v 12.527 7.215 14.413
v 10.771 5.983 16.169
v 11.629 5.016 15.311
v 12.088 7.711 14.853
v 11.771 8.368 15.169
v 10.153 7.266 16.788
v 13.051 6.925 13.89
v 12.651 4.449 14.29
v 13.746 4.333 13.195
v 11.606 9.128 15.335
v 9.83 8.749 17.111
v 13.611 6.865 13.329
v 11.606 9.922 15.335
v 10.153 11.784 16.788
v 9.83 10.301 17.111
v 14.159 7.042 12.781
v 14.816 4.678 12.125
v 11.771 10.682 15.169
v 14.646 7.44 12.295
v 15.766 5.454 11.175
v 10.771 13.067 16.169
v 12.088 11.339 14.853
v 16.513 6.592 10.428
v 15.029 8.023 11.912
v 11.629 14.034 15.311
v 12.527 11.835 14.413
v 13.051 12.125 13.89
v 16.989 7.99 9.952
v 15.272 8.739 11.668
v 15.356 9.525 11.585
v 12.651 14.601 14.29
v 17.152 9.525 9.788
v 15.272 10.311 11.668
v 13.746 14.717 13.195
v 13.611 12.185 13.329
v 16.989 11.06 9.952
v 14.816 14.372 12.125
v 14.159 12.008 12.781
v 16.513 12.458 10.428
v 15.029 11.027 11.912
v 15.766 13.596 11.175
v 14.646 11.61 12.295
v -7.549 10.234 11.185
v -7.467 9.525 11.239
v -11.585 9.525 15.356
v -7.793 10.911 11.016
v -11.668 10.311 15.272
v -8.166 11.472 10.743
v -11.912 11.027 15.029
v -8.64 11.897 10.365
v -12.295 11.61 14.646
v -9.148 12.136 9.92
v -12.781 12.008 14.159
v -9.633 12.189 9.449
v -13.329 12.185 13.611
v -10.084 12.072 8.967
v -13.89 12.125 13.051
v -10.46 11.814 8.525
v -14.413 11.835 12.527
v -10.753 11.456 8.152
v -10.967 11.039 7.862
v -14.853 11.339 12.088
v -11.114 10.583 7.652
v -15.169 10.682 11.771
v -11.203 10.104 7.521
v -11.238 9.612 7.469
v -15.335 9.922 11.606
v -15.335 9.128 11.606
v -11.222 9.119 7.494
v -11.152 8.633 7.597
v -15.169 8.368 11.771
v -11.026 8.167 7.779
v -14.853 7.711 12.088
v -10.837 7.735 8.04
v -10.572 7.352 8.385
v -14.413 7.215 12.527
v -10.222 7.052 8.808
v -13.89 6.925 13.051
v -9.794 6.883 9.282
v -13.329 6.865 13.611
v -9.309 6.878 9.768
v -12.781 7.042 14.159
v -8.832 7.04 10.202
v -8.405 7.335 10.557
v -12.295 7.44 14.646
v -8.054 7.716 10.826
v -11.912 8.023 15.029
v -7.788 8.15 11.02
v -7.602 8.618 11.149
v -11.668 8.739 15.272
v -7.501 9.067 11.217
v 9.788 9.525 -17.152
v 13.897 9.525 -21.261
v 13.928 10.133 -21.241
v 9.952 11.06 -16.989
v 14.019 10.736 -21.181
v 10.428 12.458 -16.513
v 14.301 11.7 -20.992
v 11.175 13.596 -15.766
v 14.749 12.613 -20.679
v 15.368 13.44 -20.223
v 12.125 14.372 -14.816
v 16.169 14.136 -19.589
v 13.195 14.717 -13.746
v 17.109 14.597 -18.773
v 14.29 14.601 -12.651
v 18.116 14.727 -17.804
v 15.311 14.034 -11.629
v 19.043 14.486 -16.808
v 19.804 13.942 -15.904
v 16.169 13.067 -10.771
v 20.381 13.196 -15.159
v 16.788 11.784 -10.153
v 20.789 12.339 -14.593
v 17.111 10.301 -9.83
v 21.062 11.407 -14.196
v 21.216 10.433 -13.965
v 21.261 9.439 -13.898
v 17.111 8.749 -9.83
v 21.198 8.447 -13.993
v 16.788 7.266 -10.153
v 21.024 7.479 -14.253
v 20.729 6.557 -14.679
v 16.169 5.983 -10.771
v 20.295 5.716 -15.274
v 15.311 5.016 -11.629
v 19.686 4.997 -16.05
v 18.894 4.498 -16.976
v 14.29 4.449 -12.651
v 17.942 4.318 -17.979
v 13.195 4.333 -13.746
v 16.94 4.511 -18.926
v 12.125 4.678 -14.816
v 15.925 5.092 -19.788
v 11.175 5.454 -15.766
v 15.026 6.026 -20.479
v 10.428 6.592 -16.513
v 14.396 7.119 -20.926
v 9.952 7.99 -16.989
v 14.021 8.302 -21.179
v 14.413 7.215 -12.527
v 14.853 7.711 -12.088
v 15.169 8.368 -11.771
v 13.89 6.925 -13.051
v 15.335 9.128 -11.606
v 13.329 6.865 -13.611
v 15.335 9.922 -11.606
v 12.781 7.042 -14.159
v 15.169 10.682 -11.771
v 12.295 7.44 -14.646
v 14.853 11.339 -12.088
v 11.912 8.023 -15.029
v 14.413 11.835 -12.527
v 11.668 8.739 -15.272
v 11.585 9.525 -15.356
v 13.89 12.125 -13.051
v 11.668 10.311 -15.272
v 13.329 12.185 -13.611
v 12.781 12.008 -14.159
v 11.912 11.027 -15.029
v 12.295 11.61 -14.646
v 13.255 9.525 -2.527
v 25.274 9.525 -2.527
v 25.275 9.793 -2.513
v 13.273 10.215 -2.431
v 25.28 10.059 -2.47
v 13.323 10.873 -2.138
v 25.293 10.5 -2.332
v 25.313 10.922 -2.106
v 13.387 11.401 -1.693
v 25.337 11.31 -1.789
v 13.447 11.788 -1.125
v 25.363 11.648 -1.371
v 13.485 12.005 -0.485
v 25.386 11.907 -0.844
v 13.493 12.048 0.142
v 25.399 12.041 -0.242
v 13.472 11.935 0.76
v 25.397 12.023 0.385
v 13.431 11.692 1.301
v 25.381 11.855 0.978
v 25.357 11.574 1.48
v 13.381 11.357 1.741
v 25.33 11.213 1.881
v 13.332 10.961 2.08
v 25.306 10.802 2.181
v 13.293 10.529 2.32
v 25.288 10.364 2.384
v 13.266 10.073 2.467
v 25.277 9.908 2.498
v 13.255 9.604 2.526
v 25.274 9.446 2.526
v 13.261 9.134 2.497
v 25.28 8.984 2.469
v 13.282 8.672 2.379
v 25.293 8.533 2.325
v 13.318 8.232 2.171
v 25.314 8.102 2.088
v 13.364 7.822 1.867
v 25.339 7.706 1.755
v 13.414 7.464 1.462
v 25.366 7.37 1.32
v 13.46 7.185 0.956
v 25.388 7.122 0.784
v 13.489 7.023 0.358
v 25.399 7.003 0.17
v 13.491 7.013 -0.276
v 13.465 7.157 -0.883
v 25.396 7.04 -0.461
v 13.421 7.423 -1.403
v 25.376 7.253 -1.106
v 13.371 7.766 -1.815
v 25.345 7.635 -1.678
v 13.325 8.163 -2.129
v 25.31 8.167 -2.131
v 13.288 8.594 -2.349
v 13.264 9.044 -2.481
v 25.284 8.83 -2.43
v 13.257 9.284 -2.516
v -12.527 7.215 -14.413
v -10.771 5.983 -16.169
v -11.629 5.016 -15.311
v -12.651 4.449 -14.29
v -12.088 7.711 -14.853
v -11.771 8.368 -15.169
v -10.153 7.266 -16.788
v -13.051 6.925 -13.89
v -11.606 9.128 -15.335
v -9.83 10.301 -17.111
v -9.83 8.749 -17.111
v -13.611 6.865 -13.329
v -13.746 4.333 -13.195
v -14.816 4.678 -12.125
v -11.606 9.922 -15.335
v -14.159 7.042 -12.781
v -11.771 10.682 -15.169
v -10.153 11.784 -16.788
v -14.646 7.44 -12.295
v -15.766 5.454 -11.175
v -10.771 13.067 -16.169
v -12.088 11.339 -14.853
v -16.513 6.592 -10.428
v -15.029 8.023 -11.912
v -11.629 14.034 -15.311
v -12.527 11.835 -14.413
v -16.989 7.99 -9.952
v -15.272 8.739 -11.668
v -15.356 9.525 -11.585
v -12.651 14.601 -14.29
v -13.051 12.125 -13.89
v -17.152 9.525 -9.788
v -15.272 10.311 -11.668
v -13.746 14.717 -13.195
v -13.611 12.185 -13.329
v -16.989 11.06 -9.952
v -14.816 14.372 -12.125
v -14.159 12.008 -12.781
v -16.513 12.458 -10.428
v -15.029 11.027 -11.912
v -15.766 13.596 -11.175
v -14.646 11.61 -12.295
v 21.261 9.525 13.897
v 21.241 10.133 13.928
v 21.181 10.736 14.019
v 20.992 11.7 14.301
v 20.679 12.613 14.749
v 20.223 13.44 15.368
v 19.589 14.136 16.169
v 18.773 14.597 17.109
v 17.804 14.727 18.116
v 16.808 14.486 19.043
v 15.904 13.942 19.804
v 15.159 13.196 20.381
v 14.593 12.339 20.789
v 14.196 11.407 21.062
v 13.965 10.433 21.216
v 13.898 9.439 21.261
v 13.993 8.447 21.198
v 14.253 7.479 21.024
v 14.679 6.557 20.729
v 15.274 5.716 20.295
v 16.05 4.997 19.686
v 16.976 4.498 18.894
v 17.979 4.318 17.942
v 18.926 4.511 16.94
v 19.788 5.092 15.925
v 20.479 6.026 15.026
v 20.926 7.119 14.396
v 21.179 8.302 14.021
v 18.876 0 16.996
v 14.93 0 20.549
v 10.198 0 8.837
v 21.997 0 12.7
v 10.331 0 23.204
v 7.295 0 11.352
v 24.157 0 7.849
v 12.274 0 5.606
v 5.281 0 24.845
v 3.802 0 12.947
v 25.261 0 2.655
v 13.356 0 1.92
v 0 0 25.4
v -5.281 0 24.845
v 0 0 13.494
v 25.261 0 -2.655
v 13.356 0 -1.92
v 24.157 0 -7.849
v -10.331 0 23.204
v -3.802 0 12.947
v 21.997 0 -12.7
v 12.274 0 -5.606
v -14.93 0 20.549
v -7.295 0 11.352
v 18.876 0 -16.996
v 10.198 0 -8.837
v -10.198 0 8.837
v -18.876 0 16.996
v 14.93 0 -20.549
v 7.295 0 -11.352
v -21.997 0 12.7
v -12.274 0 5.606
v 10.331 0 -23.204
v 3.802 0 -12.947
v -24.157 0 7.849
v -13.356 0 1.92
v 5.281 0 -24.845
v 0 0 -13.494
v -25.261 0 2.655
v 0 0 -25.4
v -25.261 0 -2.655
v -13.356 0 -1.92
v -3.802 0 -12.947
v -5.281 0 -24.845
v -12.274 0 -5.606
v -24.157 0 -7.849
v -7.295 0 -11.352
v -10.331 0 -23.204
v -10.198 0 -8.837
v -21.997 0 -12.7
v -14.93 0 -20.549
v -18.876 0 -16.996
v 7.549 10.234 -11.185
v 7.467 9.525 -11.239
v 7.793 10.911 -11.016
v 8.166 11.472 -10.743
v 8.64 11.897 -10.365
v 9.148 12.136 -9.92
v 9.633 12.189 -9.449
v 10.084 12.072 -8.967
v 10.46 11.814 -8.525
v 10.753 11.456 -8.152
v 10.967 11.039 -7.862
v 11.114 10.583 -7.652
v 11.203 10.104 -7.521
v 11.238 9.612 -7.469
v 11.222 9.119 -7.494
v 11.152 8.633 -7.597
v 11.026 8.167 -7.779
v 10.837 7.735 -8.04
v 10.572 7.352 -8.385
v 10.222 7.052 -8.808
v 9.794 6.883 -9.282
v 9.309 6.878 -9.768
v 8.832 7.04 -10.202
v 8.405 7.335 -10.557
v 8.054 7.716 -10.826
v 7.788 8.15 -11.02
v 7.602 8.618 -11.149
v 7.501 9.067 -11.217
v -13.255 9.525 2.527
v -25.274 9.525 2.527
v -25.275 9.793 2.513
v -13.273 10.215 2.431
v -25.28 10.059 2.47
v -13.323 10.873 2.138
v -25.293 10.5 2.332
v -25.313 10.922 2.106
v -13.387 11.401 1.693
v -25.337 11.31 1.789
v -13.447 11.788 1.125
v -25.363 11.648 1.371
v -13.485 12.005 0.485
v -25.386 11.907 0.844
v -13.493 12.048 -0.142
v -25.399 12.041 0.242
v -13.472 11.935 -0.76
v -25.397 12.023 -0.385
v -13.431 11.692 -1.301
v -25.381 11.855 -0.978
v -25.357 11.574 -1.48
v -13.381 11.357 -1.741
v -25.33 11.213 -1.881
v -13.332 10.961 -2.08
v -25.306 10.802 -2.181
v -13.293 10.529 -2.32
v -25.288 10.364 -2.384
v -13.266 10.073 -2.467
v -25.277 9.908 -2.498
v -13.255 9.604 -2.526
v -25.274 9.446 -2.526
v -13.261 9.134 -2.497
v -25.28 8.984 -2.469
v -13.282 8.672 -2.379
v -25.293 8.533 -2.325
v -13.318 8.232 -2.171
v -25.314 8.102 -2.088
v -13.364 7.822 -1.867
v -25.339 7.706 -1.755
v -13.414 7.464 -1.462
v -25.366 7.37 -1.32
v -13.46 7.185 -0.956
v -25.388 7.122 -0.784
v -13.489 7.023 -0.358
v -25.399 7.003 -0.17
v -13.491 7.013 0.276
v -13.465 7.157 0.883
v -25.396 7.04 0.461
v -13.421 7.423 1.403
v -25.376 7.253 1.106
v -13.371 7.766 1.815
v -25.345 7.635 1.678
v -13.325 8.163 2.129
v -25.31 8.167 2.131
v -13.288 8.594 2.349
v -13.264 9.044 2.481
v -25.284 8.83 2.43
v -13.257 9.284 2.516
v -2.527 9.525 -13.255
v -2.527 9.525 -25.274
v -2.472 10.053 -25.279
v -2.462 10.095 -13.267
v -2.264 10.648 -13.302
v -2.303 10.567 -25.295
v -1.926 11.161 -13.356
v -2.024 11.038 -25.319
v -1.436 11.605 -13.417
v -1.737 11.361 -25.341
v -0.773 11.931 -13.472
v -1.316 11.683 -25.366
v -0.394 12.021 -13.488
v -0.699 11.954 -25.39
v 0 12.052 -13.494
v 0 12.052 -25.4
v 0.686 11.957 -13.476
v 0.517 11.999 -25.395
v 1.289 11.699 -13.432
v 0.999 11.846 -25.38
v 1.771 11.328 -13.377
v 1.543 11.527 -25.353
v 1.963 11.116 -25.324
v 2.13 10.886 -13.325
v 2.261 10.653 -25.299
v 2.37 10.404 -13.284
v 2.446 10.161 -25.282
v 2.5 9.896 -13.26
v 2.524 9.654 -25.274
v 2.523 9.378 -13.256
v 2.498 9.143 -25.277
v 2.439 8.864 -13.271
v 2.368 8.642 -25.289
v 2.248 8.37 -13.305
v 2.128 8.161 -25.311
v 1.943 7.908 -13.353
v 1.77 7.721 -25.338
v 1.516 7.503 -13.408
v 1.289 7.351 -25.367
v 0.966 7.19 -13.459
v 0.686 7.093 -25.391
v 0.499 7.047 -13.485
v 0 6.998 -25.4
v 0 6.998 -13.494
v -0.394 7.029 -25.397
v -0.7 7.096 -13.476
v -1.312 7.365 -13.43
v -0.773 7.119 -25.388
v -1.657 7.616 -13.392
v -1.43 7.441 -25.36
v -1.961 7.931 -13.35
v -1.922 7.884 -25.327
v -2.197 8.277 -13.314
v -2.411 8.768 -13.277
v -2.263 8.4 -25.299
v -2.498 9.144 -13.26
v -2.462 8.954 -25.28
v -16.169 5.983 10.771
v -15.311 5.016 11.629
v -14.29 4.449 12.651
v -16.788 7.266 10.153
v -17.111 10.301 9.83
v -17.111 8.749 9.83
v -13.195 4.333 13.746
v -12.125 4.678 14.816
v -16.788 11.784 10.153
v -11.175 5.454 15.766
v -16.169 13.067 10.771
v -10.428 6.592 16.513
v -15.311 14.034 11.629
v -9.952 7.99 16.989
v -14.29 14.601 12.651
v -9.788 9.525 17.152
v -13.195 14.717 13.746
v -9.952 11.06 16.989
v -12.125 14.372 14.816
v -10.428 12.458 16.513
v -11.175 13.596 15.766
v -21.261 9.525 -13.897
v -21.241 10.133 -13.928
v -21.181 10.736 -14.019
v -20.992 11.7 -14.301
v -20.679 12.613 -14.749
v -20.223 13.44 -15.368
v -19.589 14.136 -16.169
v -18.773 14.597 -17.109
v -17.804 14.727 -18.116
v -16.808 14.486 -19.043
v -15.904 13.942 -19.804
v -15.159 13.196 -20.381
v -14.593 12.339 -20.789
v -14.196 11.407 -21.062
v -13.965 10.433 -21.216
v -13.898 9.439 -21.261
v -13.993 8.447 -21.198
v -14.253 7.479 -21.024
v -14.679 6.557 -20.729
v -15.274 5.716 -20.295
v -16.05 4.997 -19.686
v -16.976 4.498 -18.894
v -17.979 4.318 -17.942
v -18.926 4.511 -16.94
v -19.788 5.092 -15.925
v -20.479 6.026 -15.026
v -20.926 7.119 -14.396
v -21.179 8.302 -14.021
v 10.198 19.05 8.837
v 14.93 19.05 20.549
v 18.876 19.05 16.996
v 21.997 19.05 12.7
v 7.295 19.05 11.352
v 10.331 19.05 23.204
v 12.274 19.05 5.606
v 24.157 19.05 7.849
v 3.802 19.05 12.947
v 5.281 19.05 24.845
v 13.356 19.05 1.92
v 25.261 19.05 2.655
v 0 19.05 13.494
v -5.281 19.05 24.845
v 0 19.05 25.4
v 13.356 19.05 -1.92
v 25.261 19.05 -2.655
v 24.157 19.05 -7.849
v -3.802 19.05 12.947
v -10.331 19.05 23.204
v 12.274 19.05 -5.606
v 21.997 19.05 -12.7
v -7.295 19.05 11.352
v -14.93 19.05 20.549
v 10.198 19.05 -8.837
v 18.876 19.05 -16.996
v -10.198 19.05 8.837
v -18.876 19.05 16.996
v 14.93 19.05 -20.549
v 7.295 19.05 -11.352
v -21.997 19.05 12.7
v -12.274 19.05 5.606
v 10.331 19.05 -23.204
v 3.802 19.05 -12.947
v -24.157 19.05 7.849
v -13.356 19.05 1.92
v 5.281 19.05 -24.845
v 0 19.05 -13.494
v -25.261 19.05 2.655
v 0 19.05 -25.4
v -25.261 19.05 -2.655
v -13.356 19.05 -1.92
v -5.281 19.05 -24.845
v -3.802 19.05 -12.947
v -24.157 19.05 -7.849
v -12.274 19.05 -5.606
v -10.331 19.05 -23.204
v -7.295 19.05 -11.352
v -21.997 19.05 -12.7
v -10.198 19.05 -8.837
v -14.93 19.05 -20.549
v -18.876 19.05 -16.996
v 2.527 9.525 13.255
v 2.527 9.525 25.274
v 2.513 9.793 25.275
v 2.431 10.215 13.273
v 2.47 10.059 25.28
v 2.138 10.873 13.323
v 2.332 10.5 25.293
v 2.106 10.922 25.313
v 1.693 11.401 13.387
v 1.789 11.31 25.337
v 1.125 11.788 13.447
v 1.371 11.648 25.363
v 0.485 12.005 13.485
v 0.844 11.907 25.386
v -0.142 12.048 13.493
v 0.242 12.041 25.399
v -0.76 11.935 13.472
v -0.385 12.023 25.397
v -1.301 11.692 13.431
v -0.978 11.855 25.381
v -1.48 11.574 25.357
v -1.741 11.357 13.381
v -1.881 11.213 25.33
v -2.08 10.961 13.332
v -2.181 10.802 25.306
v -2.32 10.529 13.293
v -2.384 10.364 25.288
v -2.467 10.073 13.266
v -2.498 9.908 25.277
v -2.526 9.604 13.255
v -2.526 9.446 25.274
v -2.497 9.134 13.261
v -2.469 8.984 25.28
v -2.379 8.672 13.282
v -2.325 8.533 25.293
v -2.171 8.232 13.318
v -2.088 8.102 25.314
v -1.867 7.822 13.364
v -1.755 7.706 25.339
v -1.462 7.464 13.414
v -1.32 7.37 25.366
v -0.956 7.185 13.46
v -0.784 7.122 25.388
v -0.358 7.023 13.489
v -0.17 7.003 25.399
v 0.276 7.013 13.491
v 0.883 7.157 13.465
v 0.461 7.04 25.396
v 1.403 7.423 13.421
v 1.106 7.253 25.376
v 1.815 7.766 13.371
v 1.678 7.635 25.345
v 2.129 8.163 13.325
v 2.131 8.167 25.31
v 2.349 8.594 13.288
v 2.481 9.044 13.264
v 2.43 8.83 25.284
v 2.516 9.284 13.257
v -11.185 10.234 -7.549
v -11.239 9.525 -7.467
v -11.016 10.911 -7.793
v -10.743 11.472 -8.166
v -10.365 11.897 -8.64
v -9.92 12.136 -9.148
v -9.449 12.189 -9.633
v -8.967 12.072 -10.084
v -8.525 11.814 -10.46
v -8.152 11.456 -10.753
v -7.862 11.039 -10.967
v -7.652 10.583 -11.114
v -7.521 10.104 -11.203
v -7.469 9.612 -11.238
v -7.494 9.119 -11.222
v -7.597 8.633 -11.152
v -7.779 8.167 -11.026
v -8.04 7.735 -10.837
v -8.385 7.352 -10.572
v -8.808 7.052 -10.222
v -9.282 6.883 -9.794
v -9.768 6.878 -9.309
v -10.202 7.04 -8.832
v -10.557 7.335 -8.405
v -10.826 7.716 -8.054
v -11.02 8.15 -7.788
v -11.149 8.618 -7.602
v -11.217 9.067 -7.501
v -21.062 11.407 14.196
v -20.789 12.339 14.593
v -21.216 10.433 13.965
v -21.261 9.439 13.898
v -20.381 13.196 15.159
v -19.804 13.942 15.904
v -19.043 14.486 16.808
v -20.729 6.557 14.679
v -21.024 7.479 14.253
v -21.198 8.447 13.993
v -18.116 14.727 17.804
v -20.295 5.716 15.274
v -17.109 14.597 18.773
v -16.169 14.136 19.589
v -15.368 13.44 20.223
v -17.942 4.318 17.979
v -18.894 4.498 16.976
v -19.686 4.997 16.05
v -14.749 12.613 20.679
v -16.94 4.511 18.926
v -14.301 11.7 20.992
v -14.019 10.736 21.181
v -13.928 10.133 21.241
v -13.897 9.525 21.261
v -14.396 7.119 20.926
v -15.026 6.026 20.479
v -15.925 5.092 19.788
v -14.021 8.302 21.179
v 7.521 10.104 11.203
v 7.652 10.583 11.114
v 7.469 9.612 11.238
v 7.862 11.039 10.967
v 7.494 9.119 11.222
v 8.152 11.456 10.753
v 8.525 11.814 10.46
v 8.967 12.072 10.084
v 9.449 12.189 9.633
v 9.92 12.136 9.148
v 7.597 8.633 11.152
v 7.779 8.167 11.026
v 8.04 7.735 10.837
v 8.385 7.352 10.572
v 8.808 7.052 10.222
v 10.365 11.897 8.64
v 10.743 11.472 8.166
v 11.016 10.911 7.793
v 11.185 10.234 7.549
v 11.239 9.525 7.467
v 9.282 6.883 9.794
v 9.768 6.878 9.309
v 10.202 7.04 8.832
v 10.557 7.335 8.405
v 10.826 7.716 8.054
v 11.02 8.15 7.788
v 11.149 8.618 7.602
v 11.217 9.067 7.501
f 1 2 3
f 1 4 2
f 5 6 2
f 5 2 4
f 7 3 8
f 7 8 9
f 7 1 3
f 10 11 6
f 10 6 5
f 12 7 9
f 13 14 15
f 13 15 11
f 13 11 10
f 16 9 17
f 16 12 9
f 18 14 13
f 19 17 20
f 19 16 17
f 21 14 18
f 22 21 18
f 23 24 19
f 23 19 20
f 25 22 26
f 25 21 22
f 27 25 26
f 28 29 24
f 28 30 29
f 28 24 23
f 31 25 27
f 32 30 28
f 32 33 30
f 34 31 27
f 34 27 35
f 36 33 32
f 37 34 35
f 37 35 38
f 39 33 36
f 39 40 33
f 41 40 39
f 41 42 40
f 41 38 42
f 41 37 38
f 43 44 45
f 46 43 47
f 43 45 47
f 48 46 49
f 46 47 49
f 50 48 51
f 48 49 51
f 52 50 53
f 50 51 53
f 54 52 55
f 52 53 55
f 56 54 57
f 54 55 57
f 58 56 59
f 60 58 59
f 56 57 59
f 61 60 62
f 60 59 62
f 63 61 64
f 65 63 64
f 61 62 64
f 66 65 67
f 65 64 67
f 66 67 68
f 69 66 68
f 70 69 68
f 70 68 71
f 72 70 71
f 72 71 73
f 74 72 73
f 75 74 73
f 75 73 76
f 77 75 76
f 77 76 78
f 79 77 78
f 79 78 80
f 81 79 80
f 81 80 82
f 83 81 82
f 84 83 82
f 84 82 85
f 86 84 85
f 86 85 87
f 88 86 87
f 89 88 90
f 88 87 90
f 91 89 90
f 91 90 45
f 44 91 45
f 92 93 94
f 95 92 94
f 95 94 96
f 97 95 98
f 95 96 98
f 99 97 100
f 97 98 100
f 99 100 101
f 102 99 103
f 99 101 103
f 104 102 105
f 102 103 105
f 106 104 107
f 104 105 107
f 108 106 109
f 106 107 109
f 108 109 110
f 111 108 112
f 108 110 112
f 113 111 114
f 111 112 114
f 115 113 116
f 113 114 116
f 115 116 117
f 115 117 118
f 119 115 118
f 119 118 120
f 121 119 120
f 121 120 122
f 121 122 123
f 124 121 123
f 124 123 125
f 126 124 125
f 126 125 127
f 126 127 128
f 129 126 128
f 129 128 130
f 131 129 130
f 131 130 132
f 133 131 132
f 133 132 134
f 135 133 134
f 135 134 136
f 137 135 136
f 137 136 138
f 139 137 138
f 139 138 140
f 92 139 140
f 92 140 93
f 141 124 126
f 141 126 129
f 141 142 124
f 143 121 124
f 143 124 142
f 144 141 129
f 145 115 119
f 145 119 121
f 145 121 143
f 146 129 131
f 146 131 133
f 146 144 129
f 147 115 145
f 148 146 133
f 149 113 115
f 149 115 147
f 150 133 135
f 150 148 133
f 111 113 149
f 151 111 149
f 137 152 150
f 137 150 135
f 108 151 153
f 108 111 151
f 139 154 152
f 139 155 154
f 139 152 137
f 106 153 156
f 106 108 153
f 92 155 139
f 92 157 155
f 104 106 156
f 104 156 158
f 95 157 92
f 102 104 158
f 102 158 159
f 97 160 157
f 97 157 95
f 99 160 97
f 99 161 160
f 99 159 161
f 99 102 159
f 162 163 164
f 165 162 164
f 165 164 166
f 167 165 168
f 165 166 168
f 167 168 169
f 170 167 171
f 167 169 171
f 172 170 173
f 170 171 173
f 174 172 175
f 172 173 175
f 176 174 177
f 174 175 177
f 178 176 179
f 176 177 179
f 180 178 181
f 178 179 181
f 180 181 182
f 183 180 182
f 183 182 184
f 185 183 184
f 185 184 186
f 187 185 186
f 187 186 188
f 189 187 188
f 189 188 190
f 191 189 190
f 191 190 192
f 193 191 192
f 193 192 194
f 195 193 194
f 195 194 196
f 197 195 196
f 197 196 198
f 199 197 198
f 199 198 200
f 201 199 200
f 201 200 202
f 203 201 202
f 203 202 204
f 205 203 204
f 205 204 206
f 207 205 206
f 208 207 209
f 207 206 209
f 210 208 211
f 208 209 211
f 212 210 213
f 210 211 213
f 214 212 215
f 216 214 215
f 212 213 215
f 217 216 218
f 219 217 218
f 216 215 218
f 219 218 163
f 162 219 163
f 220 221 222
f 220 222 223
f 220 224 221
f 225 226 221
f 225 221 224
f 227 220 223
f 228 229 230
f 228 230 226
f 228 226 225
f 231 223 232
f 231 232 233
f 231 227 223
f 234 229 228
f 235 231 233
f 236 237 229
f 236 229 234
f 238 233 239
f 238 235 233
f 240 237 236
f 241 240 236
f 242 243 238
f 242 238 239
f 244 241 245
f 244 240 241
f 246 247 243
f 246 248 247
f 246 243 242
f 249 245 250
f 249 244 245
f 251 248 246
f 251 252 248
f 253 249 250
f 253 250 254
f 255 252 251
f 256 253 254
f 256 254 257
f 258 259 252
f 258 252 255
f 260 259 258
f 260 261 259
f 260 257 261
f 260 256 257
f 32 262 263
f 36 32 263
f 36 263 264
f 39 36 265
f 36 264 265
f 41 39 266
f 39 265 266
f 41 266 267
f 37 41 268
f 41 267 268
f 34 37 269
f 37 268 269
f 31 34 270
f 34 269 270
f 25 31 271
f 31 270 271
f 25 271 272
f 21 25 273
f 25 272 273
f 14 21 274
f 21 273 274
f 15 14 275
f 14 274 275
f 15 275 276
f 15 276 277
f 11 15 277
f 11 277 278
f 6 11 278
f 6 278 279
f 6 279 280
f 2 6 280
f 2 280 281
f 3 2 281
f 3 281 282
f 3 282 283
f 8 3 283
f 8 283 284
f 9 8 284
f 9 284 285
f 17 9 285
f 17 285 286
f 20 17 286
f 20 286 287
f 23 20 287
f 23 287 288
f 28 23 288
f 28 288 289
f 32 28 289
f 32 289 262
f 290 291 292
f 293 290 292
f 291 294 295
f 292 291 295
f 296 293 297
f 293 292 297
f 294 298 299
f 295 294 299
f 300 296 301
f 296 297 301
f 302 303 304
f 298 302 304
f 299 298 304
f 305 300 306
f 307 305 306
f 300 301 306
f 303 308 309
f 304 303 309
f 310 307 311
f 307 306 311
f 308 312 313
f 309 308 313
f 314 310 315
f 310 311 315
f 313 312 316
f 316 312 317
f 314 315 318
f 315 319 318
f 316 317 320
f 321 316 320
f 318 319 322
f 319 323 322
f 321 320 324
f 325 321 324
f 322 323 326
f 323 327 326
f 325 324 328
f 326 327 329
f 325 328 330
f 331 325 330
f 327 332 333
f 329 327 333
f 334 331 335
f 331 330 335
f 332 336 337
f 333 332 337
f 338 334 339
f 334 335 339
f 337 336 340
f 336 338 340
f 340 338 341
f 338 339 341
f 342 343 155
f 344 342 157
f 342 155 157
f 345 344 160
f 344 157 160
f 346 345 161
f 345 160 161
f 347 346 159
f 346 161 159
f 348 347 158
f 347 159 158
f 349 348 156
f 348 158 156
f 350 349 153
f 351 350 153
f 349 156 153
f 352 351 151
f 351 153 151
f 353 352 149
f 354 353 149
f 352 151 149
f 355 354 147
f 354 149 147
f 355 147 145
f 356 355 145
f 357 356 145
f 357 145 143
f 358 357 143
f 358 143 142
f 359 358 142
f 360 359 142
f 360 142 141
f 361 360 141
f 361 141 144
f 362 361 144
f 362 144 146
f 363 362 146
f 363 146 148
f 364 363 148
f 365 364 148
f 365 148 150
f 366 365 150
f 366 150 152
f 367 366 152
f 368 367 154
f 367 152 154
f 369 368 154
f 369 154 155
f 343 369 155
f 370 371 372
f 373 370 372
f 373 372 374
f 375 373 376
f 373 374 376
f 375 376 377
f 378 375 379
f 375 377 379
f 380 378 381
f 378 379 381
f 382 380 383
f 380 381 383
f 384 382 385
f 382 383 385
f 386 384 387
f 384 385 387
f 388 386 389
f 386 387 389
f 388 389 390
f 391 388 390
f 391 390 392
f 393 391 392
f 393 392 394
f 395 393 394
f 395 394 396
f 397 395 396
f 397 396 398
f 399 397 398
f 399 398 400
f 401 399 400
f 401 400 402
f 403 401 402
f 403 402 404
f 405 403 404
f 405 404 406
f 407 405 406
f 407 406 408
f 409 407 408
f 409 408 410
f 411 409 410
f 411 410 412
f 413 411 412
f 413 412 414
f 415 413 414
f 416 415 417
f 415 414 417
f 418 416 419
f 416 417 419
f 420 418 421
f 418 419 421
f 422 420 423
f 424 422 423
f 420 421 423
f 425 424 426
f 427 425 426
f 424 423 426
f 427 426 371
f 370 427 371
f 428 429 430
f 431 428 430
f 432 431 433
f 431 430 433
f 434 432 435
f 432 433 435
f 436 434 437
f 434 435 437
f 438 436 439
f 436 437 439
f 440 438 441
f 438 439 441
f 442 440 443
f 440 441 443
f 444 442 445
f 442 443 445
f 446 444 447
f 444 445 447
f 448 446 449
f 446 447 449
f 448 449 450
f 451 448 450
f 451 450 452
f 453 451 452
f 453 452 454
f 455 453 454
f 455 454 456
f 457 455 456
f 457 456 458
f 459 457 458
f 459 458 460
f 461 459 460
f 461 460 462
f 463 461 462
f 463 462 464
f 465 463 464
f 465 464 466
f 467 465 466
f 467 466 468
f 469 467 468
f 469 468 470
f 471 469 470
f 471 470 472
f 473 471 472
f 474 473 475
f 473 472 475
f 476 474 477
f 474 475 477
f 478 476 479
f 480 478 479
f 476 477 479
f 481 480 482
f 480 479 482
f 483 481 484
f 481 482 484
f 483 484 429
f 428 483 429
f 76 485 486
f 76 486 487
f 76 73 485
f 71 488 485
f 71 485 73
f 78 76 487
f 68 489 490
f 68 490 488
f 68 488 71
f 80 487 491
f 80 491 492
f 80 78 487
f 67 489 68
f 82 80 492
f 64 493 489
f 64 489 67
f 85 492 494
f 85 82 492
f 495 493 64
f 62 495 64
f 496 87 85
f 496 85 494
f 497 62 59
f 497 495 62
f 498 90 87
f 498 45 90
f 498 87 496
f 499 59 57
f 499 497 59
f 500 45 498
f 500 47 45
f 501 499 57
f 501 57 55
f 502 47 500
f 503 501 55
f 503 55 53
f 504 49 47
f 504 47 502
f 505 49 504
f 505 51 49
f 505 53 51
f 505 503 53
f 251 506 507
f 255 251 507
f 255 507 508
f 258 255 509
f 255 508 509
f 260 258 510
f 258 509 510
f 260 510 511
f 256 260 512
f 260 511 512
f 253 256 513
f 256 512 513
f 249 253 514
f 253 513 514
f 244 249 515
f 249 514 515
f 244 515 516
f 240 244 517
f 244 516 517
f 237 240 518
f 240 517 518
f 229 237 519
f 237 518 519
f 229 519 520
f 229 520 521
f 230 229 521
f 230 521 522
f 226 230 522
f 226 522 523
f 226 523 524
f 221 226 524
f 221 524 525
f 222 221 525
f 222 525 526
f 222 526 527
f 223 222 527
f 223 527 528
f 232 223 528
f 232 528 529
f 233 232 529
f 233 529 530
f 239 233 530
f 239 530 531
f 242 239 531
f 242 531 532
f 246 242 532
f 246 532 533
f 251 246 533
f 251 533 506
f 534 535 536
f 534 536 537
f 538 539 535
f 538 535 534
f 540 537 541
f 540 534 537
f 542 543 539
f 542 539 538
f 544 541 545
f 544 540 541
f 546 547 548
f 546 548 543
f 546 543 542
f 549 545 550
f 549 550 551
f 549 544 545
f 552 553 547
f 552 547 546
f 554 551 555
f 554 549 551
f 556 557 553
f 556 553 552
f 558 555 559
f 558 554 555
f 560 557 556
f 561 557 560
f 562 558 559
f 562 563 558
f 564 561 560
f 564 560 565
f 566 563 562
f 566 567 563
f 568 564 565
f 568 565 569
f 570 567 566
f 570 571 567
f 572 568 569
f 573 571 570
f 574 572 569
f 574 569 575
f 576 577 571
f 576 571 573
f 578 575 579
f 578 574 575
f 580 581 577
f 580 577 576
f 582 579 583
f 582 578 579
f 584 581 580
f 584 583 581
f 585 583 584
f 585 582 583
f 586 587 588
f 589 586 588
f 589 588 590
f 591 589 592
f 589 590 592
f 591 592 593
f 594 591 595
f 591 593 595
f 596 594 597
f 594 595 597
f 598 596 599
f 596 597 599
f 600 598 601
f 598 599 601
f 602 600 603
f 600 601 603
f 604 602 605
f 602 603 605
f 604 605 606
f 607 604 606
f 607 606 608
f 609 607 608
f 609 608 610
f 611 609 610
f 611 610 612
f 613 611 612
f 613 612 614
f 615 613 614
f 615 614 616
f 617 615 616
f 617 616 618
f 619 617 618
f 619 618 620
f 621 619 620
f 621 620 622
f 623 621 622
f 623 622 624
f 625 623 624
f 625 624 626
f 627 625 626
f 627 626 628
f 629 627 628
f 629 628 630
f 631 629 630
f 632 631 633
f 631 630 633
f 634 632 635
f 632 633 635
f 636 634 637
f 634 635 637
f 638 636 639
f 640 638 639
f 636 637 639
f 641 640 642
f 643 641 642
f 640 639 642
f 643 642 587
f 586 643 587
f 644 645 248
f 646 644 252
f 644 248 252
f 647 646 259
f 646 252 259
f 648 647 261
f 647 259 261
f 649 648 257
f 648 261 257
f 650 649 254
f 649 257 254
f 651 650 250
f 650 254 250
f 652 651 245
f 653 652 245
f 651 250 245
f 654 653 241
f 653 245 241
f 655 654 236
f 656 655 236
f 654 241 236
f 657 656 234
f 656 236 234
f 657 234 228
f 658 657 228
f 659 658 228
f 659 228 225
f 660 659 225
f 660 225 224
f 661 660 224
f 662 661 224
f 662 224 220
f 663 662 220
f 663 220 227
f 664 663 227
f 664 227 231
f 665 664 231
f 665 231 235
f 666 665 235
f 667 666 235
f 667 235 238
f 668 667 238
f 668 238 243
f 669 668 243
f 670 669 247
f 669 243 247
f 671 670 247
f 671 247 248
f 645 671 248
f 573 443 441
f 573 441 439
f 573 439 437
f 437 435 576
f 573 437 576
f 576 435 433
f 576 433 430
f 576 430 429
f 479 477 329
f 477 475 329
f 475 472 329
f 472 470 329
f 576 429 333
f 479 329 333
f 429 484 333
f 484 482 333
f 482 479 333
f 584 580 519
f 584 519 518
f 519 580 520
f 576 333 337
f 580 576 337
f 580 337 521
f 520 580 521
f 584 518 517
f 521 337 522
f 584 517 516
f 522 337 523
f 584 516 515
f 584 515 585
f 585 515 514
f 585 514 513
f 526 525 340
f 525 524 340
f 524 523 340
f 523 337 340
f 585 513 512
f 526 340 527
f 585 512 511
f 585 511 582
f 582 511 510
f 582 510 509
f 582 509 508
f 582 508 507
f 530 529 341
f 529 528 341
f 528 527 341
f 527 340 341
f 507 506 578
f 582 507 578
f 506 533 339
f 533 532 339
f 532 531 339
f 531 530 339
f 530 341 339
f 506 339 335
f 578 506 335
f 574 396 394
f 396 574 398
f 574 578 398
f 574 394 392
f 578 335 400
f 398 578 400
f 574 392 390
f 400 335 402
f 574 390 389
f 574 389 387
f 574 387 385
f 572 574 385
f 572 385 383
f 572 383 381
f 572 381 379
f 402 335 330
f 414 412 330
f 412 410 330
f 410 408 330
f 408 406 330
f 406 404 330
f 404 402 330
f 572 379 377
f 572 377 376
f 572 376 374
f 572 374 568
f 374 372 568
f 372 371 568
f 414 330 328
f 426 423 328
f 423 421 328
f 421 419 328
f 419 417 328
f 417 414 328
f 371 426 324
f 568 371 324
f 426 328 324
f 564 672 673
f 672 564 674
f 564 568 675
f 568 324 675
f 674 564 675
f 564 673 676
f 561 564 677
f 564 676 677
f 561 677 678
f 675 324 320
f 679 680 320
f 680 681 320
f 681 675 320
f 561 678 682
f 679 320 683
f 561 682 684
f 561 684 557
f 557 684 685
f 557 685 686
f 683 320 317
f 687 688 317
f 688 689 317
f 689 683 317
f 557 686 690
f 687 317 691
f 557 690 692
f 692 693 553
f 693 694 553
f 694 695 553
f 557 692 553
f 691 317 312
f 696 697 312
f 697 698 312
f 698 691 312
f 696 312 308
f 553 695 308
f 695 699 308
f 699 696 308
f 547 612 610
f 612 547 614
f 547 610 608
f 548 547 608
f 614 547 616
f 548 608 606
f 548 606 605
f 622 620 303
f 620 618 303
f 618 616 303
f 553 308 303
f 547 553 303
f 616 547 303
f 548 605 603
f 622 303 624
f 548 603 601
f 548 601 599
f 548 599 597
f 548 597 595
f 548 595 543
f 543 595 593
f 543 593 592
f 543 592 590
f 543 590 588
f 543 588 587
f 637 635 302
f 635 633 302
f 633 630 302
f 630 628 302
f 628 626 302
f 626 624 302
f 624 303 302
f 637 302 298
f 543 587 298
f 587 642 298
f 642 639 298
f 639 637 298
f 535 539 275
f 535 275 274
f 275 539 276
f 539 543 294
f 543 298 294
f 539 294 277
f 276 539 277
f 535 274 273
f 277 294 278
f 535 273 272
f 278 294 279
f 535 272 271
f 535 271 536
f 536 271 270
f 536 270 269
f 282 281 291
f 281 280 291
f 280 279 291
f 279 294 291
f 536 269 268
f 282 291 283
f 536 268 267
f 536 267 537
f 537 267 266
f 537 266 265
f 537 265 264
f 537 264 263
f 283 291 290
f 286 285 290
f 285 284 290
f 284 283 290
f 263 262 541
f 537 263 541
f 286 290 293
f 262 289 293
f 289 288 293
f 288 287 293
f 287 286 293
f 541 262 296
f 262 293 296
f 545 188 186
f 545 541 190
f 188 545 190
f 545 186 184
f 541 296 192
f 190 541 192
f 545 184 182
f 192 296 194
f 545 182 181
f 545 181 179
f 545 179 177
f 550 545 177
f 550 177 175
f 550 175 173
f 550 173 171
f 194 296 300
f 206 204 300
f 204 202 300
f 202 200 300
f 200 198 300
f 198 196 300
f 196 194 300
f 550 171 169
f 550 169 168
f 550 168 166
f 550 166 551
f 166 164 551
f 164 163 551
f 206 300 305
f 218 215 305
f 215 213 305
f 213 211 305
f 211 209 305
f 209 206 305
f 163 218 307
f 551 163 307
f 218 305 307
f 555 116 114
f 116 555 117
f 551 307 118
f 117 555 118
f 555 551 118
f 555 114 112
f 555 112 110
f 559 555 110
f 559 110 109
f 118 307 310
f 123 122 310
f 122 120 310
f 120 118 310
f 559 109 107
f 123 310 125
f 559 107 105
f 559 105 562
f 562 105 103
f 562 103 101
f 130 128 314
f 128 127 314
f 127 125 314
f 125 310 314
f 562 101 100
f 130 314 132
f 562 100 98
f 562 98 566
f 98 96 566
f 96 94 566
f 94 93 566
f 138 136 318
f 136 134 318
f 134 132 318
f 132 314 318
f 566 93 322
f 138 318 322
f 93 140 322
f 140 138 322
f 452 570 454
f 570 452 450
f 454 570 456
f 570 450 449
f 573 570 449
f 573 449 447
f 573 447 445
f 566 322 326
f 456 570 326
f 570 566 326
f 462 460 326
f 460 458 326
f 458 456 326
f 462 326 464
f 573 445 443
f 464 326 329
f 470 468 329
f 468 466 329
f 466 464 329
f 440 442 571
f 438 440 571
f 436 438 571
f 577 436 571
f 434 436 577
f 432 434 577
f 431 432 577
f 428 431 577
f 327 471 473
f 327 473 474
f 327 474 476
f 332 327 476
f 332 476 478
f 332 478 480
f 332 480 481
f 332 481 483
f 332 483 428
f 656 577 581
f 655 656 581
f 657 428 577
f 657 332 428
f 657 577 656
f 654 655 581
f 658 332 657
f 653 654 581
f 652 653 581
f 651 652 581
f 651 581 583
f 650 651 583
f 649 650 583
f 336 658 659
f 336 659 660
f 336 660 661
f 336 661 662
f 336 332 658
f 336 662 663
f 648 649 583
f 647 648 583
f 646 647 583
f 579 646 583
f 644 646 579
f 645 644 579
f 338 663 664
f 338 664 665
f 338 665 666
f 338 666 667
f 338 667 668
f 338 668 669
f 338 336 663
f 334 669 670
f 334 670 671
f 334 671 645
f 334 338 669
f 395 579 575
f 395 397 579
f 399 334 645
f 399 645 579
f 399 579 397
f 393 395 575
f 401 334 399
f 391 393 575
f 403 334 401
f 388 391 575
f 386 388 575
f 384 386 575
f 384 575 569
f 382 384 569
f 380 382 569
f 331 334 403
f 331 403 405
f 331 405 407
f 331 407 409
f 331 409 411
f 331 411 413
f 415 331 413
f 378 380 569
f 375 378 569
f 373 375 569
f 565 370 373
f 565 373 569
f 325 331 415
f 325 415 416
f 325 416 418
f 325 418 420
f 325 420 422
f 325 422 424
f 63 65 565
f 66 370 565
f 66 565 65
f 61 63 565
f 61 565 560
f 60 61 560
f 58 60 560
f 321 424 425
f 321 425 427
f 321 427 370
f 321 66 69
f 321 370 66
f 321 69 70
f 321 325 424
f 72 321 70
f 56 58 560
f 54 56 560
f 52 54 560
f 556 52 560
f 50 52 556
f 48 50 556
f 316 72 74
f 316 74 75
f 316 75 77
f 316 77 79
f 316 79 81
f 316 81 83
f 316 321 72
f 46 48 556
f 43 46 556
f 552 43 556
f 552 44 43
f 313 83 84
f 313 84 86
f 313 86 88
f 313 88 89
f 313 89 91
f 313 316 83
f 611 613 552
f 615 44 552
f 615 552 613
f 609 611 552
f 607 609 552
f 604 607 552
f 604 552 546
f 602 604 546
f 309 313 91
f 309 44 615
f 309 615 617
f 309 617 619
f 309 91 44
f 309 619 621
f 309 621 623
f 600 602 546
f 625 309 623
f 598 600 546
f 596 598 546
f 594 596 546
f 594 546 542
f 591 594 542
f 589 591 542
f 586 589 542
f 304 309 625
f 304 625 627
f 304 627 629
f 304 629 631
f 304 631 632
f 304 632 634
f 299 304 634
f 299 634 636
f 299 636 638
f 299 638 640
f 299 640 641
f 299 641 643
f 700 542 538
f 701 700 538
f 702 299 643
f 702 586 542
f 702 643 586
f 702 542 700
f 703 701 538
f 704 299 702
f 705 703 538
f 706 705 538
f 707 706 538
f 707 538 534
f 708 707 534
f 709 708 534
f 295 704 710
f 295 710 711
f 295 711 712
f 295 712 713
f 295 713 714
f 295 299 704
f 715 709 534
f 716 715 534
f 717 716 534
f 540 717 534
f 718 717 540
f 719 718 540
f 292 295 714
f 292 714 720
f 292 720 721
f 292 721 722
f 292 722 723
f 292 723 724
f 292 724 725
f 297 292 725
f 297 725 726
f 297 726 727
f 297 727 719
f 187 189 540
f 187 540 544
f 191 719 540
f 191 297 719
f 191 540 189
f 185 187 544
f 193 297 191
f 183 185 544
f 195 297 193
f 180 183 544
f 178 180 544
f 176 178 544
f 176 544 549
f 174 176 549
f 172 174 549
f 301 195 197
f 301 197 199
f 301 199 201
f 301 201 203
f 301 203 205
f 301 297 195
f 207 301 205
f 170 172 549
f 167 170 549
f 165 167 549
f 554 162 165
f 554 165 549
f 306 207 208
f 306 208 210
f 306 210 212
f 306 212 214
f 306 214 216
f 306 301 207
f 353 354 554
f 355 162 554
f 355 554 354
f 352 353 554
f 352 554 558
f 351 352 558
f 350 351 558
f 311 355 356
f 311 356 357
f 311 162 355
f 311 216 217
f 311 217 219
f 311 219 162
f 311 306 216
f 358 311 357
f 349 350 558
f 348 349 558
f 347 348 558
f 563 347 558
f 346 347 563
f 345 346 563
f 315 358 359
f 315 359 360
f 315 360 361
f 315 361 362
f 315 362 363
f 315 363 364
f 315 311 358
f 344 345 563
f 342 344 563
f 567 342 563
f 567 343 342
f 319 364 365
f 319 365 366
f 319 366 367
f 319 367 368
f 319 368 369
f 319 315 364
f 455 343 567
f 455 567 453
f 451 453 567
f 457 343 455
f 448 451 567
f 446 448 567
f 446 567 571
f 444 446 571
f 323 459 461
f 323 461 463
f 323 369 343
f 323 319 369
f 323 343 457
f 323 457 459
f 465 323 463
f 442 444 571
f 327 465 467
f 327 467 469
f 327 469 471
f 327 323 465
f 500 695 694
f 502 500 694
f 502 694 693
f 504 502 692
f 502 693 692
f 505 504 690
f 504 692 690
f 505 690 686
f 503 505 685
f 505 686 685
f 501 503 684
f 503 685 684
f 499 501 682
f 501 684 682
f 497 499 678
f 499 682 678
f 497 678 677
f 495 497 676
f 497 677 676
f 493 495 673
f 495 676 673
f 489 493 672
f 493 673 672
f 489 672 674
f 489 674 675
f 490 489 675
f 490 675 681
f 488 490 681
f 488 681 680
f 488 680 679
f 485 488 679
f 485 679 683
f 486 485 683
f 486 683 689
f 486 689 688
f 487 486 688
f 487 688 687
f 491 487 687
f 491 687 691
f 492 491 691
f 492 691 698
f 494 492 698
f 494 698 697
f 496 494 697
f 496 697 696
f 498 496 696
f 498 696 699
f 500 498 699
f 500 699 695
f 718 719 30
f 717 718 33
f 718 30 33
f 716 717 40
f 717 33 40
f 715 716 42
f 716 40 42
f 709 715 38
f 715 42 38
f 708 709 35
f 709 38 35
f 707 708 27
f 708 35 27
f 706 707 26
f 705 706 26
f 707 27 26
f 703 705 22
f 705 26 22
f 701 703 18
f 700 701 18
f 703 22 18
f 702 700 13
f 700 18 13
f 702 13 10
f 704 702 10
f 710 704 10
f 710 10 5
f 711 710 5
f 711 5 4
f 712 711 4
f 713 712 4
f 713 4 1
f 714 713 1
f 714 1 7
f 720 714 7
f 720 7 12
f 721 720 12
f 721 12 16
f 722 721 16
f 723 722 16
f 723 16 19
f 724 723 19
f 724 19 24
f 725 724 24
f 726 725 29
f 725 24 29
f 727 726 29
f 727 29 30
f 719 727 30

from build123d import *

# Parameters (mm, degrees)
SKETCH1_R                       = 25.4
SKETCH1_R_2                     = 13.49375
BOSS_EXTRUDE1_DEPTH             = 19.05
F_8_0_199_DIAMETER_HOLE1_REACH  = 61.906
F_8_0_199_DIAMETER_HOLE1_BORE_R = 2.5273
BULKHEAD_THROUGH_REACH          = 66.212
BULKHEAD_THROUGH_END_RADIUS     = 13.49375
SKETCH6_R                       = 2.667
SKETCH6_4_R                     = 5.207
ACCESS_HOLE_DEPTH               = 6.35
CIRPATTERN1_COUNT               = 4


with BuildPart() as part:
    # Sketch1 → Boss-Extrude1 (new body)
    with BuildSketch(Plane(origin=(0, 0, 0), x_dir=(1, 0, 0), z_dir=(0, 1, 0))):
        with Locations(Location((0, 0, 0), (0, 0, 90))):
            Circle(SKETCH1_R)
        with Locations(Location((0, 0, 0), (0, 0, 90))):
            Circle(SKETCH1_R_2, mode=Mode.SUBTRACT)
    extrude(amount=BOSS_EXTRUDE1_DEPTH)

    # #8 (0.199) Diameter Hole1 bore → #8 (0.199) Diameter Hole1 (cut, up to next)
    with BuildSketch(Plane(origin=(25.4, 0, 0), x_dir=(0, 0, -1), z_dir=(1, 0, 0)), mode=Mode.PRIVATE) as f_8_0_199_diameter_hole1_sk1:
        with Locations((0, 9.525)):
            Circle(F_8_0_199_DIAMETER_HOLE1_BORE_R)
    f_8_0_199_diameter_hole1_tool1 = extrude(f_8_0_199_diameter_hole1_sk1.sketch, amount=-F_8_0_199_DIAMETER_HOLE1_REACH, mode=Mode.PRIVATE) & part.part
    f_8_0_199_diameter_hole1 = f_8_0_199_diameter_hole1_tool1.solids().sort_by_distance((25.4, 9.525, 0))[0]
    add(f_8_0_199_diameter_hole1, mode=Mode.SUBTRACT)

    # bulkhead_through: up to this cylinder (the profile starts outside it)
    bulkhead_through_end = Plane(origin=(0, 9.525, 0), z_dir=(0, -1, 0)) * Cylinder(BULKHEAD_THROUGH_END_RADIUS, 160.4115, mode=Mode.PRIVATE)
    # Sketch6 → bulkhead_through (cut, up to the surface)
    with BuildSketch(Plane(origin=(17.960512242, 0, 17.960512242), x_dir=(0.7071067811865487, 0, -0.7071067811865465), z_dir=(0.7071067811865465, 0, 0.7071067811865487)), mode=Mode.PRIVATE) as bulkhead_through_sk1:
        with Locations((0, 9.525)):
            Circle(SKETCH6_R)
    bulkhead_through_tool1 = extrude(bulkhead_through_sk1.sketch, amount=-BULKHEAD_THROUGH_REACH, mode=Mode.PRIVATE) - bulkhead_through_end
    bulkhead_through = bulkhead_through_tool1.solids().sort_by_distance((17.960512, 9.525, 17.960512))[0]
    add(bulkhead_through, mode=Mode.SUBTRACT)

    # Sketch6<4> → access_hole (cut)
    with BuildSketch(Plane(origin=(17.960512242, 0, 17.960512242), x_dir=(0.7071067811865487, 0, -0.7071067811865465), z_dir=(0.7071067811865465, 0, 0.7071067811865487))):
        with Locations((0, 9.525)):
            Circle(SKETCH6_4_R)
    access_hole = extrude(amount=-ACCESS_HOLE_DEPTH, mode=Mode.SUBTRACT)

    # CirPattern1: #8 (0.199) Diameter Hole1, bulkhead_through, access_hole ×4 about axis
    cirpattern1_axis = Axis((0, 0, 0), (0, 1, 0))
    add([f_8_0_199_diameter_hole1.rotate(cirpattern1_axis, i * 360 / CIRPATTERN1_COUNT) for i in range(1, CIRPATTERN1_COUNT)], mode=Mode.SUBTRACT)
    add([bulkhead_through.rotate(cirpattern1_axis, i * 360 / CIRPATTERN1_COUNT) for i in range(1, CIRPATTERN1_COUNT)], mode=Mode.SUBTRACT)
    add([access_hole.rotate(cirpattern1_axis, i * 360 / CIRPATTERN1_COUNT) for i in range(1, CIRPATTERN1_COUNT)], mode=Mode.SUBTRACT)


solid = part.part
